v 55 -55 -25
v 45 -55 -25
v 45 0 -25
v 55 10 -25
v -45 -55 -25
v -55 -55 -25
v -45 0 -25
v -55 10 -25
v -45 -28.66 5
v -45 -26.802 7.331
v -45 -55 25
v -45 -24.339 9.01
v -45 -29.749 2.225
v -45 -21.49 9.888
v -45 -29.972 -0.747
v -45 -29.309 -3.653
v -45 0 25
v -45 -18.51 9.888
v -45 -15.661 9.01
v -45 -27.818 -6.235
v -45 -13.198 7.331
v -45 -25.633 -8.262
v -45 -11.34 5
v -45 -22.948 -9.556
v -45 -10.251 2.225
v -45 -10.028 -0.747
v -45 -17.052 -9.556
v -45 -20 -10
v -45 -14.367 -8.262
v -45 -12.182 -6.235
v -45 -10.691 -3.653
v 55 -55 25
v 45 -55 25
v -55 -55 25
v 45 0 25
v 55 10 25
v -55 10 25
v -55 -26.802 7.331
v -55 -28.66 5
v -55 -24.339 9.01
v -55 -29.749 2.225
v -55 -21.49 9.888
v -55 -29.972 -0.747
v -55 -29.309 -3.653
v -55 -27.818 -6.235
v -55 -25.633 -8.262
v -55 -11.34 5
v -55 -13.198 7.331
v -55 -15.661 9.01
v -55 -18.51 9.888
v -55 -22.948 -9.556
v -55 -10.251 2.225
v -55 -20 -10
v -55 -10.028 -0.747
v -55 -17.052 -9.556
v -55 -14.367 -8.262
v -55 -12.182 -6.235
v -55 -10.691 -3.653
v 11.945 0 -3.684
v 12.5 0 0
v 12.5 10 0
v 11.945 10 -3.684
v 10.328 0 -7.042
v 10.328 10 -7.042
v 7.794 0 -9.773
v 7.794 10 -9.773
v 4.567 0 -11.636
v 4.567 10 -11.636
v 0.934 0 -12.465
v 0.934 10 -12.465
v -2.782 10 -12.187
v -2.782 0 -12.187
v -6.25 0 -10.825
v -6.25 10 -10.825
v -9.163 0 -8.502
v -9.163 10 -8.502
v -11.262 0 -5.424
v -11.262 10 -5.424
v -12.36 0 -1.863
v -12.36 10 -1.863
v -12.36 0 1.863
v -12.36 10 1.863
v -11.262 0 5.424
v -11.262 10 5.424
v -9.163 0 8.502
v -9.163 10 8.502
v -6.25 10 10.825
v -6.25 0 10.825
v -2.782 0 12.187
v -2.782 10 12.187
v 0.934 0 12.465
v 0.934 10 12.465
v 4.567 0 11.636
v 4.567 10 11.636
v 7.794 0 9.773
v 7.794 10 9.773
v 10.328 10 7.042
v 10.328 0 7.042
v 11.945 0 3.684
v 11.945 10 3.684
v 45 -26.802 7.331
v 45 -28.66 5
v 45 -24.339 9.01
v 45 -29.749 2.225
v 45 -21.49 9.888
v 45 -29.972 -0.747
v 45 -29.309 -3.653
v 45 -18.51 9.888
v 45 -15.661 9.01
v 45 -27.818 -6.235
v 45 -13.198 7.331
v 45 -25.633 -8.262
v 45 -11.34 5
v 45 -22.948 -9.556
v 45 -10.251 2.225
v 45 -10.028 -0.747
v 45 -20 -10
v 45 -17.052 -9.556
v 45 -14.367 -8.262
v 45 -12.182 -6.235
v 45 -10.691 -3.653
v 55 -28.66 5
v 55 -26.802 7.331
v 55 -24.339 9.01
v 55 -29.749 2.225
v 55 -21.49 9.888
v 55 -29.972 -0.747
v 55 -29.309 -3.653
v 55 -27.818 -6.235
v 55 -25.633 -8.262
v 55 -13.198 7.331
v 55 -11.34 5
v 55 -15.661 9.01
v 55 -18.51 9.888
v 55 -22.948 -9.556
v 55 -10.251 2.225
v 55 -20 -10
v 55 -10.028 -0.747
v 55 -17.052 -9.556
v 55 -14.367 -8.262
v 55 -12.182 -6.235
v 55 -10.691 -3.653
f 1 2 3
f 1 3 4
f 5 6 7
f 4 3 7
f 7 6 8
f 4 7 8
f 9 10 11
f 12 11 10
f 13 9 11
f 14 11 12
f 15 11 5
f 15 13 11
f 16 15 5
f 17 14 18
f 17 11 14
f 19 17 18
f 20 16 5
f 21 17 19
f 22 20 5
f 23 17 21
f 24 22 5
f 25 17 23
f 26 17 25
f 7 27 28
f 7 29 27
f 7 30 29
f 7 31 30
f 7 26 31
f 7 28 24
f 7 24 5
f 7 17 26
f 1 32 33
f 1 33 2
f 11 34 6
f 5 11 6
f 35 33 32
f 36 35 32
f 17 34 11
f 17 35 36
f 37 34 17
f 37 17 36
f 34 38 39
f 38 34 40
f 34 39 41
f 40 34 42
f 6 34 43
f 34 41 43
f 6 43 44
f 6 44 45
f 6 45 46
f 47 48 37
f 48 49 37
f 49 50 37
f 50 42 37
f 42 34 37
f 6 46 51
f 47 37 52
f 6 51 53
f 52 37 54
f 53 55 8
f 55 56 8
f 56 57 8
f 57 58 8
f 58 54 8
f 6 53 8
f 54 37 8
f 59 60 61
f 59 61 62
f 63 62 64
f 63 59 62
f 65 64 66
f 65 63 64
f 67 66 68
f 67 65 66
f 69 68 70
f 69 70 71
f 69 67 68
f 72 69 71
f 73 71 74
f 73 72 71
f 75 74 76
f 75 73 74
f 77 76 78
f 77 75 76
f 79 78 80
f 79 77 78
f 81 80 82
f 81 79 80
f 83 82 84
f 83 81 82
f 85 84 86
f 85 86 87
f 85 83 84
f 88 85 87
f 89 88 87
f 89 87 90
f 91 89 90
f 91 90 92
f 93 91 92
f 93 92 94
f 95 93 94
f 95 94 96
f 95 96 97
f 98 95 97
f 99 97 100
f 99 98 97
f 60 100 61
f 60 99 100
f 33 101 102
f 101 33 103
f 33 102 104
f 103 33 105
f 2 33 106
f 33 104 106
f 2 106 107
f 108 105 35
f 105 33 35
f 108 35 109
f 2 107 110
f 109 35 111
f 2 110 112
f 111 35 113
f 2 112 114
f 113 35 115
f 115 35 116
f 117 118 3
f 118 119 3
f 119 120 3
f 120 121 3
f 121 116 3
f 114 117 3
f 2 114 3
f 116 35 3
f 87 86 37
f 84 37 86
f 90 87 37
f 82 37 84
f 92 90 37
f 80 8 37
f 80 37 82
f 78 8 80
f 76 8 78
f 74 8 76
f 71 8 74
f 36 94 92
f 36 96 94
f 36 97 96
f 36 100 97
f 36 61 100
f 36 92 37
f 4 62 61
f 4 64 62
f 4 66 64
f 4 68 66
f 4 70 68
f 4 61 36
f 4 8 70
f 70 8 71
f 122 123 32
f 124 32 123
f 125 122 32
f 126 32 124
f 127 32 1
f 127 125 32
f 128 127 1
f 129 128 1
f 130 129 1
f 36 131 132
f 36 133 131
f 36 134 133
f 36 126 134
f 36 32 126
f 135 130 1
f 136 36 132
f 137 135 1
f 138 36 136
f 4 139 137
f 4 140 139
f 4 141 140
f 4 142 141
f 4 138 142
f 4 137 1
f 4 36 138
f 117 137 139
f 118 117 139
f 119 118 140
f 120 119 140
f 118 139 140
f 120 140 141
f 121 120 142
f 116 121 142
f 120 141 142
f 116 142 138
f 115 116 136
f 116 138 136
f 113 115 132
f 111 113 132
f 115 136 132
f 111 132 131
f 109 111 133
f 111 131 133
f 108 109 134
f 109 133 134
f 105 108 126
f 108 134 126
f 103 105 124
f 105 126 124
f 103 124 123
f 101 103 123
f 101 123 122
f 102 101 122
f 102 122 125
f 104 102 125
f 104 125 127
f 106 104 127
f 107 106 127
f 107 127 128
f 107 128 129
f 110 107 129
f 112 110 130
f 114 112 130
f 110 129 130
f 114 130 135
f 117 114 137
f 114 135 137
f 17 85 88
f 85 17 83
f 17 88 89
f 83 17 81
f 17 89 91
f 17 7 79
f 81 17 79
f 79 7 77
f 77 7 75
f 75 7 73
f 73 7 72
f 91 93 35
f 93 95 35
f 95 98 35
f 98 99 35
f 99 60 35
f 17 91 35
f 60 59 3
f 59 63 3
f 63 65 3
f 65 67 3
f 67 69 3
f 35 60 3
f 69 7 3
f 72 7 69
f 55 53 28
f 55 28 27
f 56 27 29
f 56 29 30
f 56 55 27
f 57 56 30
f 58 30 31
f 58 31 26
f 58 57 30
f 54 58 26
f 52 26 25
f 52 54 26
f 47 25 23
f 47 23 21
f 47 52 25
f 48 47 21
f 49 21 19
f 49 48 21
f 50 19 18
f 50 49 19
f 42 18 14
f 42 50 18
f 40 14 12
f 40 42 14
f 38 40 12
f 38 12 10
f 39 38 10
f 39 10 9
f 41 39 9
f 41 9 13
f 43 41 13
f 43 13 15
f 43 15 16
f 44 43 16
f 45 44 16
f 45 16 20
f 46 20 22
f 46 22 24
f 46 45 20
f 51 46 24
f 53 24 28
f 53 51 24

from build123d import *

# Parameters (mm, degrees)
SKETCH1_W           = 110
SKETCH1_H           = 50
SKETCH1_R           = 12.5
BOSS_EXTRUDE1_DEPTH = 10
BOSS_EXTRUDE2_START = 55
SKETCH2_W           = 50
SKETCH2_H           = 65
SKETCH2_R           = 10
BOSS_EXTRUDE2_DEPTH = 10
BOSS_EXTRUDE3_START = -55
SKETCH2_2_W         = 50
SKETCH2_2_H         = 65
SKETCH2_2_R         = 10
BOSS_EXTRUDE3_DEPTH = 10


with BuildPart() as part:
    # Sketch1 → Boss-Extrude1 (new body)
    with BuildSketch(Plane(origin=(0, 0, 0), x_dir=(1, 0, 0), z_dir=(0, 1, 0))):
        Rectangle(SKETCH1_W, SKETCH1_H)
        Circle(SKETCH1_R, mode=Mode.SUBTRACT)
    extrude(amount=BOSS_EXTRUDE1_DEPTH)

    # Sketch2 → Boss-Extrude2 (add)
    with BuildSketch(Plane(origin=(0, 0, 0), x_dir=(0, 0, -1), z_dir=(1, 0, 0)).offset(BOSS_EXTRUDE2_START)):
        with Locations((0, -22.5)):
            Rectangle(SKETCH2_W, SKETCH2_H)
        with Locations((0, -20)):
            Circle(SKETCH2_R, mode=Mode.SUBTRACT)
    extrude(amount=-BOSS_EXTRUDE2_DEPTH)

    # Sketch2<2> → Boss-Extrude3 (add)
    with BuildSketch(Plane(origin=(0, 0, 0), x_dir=(0, 0, -1), z_dir=(1, 0, 0)).offset(BOSS_EXTRUDE3_START)):
        with Locations((0, -22.5)):
            Rectangle(SKETCH2_2_W, SKETCH2_2_H)
        with Locations((0, -20)):
            Circle(SKETCH2_2_R, mode=Mode.SUBTRACT)
    extrude(amount=BOSS_EXTRUDE3_DEPTH)


solid = part.part
